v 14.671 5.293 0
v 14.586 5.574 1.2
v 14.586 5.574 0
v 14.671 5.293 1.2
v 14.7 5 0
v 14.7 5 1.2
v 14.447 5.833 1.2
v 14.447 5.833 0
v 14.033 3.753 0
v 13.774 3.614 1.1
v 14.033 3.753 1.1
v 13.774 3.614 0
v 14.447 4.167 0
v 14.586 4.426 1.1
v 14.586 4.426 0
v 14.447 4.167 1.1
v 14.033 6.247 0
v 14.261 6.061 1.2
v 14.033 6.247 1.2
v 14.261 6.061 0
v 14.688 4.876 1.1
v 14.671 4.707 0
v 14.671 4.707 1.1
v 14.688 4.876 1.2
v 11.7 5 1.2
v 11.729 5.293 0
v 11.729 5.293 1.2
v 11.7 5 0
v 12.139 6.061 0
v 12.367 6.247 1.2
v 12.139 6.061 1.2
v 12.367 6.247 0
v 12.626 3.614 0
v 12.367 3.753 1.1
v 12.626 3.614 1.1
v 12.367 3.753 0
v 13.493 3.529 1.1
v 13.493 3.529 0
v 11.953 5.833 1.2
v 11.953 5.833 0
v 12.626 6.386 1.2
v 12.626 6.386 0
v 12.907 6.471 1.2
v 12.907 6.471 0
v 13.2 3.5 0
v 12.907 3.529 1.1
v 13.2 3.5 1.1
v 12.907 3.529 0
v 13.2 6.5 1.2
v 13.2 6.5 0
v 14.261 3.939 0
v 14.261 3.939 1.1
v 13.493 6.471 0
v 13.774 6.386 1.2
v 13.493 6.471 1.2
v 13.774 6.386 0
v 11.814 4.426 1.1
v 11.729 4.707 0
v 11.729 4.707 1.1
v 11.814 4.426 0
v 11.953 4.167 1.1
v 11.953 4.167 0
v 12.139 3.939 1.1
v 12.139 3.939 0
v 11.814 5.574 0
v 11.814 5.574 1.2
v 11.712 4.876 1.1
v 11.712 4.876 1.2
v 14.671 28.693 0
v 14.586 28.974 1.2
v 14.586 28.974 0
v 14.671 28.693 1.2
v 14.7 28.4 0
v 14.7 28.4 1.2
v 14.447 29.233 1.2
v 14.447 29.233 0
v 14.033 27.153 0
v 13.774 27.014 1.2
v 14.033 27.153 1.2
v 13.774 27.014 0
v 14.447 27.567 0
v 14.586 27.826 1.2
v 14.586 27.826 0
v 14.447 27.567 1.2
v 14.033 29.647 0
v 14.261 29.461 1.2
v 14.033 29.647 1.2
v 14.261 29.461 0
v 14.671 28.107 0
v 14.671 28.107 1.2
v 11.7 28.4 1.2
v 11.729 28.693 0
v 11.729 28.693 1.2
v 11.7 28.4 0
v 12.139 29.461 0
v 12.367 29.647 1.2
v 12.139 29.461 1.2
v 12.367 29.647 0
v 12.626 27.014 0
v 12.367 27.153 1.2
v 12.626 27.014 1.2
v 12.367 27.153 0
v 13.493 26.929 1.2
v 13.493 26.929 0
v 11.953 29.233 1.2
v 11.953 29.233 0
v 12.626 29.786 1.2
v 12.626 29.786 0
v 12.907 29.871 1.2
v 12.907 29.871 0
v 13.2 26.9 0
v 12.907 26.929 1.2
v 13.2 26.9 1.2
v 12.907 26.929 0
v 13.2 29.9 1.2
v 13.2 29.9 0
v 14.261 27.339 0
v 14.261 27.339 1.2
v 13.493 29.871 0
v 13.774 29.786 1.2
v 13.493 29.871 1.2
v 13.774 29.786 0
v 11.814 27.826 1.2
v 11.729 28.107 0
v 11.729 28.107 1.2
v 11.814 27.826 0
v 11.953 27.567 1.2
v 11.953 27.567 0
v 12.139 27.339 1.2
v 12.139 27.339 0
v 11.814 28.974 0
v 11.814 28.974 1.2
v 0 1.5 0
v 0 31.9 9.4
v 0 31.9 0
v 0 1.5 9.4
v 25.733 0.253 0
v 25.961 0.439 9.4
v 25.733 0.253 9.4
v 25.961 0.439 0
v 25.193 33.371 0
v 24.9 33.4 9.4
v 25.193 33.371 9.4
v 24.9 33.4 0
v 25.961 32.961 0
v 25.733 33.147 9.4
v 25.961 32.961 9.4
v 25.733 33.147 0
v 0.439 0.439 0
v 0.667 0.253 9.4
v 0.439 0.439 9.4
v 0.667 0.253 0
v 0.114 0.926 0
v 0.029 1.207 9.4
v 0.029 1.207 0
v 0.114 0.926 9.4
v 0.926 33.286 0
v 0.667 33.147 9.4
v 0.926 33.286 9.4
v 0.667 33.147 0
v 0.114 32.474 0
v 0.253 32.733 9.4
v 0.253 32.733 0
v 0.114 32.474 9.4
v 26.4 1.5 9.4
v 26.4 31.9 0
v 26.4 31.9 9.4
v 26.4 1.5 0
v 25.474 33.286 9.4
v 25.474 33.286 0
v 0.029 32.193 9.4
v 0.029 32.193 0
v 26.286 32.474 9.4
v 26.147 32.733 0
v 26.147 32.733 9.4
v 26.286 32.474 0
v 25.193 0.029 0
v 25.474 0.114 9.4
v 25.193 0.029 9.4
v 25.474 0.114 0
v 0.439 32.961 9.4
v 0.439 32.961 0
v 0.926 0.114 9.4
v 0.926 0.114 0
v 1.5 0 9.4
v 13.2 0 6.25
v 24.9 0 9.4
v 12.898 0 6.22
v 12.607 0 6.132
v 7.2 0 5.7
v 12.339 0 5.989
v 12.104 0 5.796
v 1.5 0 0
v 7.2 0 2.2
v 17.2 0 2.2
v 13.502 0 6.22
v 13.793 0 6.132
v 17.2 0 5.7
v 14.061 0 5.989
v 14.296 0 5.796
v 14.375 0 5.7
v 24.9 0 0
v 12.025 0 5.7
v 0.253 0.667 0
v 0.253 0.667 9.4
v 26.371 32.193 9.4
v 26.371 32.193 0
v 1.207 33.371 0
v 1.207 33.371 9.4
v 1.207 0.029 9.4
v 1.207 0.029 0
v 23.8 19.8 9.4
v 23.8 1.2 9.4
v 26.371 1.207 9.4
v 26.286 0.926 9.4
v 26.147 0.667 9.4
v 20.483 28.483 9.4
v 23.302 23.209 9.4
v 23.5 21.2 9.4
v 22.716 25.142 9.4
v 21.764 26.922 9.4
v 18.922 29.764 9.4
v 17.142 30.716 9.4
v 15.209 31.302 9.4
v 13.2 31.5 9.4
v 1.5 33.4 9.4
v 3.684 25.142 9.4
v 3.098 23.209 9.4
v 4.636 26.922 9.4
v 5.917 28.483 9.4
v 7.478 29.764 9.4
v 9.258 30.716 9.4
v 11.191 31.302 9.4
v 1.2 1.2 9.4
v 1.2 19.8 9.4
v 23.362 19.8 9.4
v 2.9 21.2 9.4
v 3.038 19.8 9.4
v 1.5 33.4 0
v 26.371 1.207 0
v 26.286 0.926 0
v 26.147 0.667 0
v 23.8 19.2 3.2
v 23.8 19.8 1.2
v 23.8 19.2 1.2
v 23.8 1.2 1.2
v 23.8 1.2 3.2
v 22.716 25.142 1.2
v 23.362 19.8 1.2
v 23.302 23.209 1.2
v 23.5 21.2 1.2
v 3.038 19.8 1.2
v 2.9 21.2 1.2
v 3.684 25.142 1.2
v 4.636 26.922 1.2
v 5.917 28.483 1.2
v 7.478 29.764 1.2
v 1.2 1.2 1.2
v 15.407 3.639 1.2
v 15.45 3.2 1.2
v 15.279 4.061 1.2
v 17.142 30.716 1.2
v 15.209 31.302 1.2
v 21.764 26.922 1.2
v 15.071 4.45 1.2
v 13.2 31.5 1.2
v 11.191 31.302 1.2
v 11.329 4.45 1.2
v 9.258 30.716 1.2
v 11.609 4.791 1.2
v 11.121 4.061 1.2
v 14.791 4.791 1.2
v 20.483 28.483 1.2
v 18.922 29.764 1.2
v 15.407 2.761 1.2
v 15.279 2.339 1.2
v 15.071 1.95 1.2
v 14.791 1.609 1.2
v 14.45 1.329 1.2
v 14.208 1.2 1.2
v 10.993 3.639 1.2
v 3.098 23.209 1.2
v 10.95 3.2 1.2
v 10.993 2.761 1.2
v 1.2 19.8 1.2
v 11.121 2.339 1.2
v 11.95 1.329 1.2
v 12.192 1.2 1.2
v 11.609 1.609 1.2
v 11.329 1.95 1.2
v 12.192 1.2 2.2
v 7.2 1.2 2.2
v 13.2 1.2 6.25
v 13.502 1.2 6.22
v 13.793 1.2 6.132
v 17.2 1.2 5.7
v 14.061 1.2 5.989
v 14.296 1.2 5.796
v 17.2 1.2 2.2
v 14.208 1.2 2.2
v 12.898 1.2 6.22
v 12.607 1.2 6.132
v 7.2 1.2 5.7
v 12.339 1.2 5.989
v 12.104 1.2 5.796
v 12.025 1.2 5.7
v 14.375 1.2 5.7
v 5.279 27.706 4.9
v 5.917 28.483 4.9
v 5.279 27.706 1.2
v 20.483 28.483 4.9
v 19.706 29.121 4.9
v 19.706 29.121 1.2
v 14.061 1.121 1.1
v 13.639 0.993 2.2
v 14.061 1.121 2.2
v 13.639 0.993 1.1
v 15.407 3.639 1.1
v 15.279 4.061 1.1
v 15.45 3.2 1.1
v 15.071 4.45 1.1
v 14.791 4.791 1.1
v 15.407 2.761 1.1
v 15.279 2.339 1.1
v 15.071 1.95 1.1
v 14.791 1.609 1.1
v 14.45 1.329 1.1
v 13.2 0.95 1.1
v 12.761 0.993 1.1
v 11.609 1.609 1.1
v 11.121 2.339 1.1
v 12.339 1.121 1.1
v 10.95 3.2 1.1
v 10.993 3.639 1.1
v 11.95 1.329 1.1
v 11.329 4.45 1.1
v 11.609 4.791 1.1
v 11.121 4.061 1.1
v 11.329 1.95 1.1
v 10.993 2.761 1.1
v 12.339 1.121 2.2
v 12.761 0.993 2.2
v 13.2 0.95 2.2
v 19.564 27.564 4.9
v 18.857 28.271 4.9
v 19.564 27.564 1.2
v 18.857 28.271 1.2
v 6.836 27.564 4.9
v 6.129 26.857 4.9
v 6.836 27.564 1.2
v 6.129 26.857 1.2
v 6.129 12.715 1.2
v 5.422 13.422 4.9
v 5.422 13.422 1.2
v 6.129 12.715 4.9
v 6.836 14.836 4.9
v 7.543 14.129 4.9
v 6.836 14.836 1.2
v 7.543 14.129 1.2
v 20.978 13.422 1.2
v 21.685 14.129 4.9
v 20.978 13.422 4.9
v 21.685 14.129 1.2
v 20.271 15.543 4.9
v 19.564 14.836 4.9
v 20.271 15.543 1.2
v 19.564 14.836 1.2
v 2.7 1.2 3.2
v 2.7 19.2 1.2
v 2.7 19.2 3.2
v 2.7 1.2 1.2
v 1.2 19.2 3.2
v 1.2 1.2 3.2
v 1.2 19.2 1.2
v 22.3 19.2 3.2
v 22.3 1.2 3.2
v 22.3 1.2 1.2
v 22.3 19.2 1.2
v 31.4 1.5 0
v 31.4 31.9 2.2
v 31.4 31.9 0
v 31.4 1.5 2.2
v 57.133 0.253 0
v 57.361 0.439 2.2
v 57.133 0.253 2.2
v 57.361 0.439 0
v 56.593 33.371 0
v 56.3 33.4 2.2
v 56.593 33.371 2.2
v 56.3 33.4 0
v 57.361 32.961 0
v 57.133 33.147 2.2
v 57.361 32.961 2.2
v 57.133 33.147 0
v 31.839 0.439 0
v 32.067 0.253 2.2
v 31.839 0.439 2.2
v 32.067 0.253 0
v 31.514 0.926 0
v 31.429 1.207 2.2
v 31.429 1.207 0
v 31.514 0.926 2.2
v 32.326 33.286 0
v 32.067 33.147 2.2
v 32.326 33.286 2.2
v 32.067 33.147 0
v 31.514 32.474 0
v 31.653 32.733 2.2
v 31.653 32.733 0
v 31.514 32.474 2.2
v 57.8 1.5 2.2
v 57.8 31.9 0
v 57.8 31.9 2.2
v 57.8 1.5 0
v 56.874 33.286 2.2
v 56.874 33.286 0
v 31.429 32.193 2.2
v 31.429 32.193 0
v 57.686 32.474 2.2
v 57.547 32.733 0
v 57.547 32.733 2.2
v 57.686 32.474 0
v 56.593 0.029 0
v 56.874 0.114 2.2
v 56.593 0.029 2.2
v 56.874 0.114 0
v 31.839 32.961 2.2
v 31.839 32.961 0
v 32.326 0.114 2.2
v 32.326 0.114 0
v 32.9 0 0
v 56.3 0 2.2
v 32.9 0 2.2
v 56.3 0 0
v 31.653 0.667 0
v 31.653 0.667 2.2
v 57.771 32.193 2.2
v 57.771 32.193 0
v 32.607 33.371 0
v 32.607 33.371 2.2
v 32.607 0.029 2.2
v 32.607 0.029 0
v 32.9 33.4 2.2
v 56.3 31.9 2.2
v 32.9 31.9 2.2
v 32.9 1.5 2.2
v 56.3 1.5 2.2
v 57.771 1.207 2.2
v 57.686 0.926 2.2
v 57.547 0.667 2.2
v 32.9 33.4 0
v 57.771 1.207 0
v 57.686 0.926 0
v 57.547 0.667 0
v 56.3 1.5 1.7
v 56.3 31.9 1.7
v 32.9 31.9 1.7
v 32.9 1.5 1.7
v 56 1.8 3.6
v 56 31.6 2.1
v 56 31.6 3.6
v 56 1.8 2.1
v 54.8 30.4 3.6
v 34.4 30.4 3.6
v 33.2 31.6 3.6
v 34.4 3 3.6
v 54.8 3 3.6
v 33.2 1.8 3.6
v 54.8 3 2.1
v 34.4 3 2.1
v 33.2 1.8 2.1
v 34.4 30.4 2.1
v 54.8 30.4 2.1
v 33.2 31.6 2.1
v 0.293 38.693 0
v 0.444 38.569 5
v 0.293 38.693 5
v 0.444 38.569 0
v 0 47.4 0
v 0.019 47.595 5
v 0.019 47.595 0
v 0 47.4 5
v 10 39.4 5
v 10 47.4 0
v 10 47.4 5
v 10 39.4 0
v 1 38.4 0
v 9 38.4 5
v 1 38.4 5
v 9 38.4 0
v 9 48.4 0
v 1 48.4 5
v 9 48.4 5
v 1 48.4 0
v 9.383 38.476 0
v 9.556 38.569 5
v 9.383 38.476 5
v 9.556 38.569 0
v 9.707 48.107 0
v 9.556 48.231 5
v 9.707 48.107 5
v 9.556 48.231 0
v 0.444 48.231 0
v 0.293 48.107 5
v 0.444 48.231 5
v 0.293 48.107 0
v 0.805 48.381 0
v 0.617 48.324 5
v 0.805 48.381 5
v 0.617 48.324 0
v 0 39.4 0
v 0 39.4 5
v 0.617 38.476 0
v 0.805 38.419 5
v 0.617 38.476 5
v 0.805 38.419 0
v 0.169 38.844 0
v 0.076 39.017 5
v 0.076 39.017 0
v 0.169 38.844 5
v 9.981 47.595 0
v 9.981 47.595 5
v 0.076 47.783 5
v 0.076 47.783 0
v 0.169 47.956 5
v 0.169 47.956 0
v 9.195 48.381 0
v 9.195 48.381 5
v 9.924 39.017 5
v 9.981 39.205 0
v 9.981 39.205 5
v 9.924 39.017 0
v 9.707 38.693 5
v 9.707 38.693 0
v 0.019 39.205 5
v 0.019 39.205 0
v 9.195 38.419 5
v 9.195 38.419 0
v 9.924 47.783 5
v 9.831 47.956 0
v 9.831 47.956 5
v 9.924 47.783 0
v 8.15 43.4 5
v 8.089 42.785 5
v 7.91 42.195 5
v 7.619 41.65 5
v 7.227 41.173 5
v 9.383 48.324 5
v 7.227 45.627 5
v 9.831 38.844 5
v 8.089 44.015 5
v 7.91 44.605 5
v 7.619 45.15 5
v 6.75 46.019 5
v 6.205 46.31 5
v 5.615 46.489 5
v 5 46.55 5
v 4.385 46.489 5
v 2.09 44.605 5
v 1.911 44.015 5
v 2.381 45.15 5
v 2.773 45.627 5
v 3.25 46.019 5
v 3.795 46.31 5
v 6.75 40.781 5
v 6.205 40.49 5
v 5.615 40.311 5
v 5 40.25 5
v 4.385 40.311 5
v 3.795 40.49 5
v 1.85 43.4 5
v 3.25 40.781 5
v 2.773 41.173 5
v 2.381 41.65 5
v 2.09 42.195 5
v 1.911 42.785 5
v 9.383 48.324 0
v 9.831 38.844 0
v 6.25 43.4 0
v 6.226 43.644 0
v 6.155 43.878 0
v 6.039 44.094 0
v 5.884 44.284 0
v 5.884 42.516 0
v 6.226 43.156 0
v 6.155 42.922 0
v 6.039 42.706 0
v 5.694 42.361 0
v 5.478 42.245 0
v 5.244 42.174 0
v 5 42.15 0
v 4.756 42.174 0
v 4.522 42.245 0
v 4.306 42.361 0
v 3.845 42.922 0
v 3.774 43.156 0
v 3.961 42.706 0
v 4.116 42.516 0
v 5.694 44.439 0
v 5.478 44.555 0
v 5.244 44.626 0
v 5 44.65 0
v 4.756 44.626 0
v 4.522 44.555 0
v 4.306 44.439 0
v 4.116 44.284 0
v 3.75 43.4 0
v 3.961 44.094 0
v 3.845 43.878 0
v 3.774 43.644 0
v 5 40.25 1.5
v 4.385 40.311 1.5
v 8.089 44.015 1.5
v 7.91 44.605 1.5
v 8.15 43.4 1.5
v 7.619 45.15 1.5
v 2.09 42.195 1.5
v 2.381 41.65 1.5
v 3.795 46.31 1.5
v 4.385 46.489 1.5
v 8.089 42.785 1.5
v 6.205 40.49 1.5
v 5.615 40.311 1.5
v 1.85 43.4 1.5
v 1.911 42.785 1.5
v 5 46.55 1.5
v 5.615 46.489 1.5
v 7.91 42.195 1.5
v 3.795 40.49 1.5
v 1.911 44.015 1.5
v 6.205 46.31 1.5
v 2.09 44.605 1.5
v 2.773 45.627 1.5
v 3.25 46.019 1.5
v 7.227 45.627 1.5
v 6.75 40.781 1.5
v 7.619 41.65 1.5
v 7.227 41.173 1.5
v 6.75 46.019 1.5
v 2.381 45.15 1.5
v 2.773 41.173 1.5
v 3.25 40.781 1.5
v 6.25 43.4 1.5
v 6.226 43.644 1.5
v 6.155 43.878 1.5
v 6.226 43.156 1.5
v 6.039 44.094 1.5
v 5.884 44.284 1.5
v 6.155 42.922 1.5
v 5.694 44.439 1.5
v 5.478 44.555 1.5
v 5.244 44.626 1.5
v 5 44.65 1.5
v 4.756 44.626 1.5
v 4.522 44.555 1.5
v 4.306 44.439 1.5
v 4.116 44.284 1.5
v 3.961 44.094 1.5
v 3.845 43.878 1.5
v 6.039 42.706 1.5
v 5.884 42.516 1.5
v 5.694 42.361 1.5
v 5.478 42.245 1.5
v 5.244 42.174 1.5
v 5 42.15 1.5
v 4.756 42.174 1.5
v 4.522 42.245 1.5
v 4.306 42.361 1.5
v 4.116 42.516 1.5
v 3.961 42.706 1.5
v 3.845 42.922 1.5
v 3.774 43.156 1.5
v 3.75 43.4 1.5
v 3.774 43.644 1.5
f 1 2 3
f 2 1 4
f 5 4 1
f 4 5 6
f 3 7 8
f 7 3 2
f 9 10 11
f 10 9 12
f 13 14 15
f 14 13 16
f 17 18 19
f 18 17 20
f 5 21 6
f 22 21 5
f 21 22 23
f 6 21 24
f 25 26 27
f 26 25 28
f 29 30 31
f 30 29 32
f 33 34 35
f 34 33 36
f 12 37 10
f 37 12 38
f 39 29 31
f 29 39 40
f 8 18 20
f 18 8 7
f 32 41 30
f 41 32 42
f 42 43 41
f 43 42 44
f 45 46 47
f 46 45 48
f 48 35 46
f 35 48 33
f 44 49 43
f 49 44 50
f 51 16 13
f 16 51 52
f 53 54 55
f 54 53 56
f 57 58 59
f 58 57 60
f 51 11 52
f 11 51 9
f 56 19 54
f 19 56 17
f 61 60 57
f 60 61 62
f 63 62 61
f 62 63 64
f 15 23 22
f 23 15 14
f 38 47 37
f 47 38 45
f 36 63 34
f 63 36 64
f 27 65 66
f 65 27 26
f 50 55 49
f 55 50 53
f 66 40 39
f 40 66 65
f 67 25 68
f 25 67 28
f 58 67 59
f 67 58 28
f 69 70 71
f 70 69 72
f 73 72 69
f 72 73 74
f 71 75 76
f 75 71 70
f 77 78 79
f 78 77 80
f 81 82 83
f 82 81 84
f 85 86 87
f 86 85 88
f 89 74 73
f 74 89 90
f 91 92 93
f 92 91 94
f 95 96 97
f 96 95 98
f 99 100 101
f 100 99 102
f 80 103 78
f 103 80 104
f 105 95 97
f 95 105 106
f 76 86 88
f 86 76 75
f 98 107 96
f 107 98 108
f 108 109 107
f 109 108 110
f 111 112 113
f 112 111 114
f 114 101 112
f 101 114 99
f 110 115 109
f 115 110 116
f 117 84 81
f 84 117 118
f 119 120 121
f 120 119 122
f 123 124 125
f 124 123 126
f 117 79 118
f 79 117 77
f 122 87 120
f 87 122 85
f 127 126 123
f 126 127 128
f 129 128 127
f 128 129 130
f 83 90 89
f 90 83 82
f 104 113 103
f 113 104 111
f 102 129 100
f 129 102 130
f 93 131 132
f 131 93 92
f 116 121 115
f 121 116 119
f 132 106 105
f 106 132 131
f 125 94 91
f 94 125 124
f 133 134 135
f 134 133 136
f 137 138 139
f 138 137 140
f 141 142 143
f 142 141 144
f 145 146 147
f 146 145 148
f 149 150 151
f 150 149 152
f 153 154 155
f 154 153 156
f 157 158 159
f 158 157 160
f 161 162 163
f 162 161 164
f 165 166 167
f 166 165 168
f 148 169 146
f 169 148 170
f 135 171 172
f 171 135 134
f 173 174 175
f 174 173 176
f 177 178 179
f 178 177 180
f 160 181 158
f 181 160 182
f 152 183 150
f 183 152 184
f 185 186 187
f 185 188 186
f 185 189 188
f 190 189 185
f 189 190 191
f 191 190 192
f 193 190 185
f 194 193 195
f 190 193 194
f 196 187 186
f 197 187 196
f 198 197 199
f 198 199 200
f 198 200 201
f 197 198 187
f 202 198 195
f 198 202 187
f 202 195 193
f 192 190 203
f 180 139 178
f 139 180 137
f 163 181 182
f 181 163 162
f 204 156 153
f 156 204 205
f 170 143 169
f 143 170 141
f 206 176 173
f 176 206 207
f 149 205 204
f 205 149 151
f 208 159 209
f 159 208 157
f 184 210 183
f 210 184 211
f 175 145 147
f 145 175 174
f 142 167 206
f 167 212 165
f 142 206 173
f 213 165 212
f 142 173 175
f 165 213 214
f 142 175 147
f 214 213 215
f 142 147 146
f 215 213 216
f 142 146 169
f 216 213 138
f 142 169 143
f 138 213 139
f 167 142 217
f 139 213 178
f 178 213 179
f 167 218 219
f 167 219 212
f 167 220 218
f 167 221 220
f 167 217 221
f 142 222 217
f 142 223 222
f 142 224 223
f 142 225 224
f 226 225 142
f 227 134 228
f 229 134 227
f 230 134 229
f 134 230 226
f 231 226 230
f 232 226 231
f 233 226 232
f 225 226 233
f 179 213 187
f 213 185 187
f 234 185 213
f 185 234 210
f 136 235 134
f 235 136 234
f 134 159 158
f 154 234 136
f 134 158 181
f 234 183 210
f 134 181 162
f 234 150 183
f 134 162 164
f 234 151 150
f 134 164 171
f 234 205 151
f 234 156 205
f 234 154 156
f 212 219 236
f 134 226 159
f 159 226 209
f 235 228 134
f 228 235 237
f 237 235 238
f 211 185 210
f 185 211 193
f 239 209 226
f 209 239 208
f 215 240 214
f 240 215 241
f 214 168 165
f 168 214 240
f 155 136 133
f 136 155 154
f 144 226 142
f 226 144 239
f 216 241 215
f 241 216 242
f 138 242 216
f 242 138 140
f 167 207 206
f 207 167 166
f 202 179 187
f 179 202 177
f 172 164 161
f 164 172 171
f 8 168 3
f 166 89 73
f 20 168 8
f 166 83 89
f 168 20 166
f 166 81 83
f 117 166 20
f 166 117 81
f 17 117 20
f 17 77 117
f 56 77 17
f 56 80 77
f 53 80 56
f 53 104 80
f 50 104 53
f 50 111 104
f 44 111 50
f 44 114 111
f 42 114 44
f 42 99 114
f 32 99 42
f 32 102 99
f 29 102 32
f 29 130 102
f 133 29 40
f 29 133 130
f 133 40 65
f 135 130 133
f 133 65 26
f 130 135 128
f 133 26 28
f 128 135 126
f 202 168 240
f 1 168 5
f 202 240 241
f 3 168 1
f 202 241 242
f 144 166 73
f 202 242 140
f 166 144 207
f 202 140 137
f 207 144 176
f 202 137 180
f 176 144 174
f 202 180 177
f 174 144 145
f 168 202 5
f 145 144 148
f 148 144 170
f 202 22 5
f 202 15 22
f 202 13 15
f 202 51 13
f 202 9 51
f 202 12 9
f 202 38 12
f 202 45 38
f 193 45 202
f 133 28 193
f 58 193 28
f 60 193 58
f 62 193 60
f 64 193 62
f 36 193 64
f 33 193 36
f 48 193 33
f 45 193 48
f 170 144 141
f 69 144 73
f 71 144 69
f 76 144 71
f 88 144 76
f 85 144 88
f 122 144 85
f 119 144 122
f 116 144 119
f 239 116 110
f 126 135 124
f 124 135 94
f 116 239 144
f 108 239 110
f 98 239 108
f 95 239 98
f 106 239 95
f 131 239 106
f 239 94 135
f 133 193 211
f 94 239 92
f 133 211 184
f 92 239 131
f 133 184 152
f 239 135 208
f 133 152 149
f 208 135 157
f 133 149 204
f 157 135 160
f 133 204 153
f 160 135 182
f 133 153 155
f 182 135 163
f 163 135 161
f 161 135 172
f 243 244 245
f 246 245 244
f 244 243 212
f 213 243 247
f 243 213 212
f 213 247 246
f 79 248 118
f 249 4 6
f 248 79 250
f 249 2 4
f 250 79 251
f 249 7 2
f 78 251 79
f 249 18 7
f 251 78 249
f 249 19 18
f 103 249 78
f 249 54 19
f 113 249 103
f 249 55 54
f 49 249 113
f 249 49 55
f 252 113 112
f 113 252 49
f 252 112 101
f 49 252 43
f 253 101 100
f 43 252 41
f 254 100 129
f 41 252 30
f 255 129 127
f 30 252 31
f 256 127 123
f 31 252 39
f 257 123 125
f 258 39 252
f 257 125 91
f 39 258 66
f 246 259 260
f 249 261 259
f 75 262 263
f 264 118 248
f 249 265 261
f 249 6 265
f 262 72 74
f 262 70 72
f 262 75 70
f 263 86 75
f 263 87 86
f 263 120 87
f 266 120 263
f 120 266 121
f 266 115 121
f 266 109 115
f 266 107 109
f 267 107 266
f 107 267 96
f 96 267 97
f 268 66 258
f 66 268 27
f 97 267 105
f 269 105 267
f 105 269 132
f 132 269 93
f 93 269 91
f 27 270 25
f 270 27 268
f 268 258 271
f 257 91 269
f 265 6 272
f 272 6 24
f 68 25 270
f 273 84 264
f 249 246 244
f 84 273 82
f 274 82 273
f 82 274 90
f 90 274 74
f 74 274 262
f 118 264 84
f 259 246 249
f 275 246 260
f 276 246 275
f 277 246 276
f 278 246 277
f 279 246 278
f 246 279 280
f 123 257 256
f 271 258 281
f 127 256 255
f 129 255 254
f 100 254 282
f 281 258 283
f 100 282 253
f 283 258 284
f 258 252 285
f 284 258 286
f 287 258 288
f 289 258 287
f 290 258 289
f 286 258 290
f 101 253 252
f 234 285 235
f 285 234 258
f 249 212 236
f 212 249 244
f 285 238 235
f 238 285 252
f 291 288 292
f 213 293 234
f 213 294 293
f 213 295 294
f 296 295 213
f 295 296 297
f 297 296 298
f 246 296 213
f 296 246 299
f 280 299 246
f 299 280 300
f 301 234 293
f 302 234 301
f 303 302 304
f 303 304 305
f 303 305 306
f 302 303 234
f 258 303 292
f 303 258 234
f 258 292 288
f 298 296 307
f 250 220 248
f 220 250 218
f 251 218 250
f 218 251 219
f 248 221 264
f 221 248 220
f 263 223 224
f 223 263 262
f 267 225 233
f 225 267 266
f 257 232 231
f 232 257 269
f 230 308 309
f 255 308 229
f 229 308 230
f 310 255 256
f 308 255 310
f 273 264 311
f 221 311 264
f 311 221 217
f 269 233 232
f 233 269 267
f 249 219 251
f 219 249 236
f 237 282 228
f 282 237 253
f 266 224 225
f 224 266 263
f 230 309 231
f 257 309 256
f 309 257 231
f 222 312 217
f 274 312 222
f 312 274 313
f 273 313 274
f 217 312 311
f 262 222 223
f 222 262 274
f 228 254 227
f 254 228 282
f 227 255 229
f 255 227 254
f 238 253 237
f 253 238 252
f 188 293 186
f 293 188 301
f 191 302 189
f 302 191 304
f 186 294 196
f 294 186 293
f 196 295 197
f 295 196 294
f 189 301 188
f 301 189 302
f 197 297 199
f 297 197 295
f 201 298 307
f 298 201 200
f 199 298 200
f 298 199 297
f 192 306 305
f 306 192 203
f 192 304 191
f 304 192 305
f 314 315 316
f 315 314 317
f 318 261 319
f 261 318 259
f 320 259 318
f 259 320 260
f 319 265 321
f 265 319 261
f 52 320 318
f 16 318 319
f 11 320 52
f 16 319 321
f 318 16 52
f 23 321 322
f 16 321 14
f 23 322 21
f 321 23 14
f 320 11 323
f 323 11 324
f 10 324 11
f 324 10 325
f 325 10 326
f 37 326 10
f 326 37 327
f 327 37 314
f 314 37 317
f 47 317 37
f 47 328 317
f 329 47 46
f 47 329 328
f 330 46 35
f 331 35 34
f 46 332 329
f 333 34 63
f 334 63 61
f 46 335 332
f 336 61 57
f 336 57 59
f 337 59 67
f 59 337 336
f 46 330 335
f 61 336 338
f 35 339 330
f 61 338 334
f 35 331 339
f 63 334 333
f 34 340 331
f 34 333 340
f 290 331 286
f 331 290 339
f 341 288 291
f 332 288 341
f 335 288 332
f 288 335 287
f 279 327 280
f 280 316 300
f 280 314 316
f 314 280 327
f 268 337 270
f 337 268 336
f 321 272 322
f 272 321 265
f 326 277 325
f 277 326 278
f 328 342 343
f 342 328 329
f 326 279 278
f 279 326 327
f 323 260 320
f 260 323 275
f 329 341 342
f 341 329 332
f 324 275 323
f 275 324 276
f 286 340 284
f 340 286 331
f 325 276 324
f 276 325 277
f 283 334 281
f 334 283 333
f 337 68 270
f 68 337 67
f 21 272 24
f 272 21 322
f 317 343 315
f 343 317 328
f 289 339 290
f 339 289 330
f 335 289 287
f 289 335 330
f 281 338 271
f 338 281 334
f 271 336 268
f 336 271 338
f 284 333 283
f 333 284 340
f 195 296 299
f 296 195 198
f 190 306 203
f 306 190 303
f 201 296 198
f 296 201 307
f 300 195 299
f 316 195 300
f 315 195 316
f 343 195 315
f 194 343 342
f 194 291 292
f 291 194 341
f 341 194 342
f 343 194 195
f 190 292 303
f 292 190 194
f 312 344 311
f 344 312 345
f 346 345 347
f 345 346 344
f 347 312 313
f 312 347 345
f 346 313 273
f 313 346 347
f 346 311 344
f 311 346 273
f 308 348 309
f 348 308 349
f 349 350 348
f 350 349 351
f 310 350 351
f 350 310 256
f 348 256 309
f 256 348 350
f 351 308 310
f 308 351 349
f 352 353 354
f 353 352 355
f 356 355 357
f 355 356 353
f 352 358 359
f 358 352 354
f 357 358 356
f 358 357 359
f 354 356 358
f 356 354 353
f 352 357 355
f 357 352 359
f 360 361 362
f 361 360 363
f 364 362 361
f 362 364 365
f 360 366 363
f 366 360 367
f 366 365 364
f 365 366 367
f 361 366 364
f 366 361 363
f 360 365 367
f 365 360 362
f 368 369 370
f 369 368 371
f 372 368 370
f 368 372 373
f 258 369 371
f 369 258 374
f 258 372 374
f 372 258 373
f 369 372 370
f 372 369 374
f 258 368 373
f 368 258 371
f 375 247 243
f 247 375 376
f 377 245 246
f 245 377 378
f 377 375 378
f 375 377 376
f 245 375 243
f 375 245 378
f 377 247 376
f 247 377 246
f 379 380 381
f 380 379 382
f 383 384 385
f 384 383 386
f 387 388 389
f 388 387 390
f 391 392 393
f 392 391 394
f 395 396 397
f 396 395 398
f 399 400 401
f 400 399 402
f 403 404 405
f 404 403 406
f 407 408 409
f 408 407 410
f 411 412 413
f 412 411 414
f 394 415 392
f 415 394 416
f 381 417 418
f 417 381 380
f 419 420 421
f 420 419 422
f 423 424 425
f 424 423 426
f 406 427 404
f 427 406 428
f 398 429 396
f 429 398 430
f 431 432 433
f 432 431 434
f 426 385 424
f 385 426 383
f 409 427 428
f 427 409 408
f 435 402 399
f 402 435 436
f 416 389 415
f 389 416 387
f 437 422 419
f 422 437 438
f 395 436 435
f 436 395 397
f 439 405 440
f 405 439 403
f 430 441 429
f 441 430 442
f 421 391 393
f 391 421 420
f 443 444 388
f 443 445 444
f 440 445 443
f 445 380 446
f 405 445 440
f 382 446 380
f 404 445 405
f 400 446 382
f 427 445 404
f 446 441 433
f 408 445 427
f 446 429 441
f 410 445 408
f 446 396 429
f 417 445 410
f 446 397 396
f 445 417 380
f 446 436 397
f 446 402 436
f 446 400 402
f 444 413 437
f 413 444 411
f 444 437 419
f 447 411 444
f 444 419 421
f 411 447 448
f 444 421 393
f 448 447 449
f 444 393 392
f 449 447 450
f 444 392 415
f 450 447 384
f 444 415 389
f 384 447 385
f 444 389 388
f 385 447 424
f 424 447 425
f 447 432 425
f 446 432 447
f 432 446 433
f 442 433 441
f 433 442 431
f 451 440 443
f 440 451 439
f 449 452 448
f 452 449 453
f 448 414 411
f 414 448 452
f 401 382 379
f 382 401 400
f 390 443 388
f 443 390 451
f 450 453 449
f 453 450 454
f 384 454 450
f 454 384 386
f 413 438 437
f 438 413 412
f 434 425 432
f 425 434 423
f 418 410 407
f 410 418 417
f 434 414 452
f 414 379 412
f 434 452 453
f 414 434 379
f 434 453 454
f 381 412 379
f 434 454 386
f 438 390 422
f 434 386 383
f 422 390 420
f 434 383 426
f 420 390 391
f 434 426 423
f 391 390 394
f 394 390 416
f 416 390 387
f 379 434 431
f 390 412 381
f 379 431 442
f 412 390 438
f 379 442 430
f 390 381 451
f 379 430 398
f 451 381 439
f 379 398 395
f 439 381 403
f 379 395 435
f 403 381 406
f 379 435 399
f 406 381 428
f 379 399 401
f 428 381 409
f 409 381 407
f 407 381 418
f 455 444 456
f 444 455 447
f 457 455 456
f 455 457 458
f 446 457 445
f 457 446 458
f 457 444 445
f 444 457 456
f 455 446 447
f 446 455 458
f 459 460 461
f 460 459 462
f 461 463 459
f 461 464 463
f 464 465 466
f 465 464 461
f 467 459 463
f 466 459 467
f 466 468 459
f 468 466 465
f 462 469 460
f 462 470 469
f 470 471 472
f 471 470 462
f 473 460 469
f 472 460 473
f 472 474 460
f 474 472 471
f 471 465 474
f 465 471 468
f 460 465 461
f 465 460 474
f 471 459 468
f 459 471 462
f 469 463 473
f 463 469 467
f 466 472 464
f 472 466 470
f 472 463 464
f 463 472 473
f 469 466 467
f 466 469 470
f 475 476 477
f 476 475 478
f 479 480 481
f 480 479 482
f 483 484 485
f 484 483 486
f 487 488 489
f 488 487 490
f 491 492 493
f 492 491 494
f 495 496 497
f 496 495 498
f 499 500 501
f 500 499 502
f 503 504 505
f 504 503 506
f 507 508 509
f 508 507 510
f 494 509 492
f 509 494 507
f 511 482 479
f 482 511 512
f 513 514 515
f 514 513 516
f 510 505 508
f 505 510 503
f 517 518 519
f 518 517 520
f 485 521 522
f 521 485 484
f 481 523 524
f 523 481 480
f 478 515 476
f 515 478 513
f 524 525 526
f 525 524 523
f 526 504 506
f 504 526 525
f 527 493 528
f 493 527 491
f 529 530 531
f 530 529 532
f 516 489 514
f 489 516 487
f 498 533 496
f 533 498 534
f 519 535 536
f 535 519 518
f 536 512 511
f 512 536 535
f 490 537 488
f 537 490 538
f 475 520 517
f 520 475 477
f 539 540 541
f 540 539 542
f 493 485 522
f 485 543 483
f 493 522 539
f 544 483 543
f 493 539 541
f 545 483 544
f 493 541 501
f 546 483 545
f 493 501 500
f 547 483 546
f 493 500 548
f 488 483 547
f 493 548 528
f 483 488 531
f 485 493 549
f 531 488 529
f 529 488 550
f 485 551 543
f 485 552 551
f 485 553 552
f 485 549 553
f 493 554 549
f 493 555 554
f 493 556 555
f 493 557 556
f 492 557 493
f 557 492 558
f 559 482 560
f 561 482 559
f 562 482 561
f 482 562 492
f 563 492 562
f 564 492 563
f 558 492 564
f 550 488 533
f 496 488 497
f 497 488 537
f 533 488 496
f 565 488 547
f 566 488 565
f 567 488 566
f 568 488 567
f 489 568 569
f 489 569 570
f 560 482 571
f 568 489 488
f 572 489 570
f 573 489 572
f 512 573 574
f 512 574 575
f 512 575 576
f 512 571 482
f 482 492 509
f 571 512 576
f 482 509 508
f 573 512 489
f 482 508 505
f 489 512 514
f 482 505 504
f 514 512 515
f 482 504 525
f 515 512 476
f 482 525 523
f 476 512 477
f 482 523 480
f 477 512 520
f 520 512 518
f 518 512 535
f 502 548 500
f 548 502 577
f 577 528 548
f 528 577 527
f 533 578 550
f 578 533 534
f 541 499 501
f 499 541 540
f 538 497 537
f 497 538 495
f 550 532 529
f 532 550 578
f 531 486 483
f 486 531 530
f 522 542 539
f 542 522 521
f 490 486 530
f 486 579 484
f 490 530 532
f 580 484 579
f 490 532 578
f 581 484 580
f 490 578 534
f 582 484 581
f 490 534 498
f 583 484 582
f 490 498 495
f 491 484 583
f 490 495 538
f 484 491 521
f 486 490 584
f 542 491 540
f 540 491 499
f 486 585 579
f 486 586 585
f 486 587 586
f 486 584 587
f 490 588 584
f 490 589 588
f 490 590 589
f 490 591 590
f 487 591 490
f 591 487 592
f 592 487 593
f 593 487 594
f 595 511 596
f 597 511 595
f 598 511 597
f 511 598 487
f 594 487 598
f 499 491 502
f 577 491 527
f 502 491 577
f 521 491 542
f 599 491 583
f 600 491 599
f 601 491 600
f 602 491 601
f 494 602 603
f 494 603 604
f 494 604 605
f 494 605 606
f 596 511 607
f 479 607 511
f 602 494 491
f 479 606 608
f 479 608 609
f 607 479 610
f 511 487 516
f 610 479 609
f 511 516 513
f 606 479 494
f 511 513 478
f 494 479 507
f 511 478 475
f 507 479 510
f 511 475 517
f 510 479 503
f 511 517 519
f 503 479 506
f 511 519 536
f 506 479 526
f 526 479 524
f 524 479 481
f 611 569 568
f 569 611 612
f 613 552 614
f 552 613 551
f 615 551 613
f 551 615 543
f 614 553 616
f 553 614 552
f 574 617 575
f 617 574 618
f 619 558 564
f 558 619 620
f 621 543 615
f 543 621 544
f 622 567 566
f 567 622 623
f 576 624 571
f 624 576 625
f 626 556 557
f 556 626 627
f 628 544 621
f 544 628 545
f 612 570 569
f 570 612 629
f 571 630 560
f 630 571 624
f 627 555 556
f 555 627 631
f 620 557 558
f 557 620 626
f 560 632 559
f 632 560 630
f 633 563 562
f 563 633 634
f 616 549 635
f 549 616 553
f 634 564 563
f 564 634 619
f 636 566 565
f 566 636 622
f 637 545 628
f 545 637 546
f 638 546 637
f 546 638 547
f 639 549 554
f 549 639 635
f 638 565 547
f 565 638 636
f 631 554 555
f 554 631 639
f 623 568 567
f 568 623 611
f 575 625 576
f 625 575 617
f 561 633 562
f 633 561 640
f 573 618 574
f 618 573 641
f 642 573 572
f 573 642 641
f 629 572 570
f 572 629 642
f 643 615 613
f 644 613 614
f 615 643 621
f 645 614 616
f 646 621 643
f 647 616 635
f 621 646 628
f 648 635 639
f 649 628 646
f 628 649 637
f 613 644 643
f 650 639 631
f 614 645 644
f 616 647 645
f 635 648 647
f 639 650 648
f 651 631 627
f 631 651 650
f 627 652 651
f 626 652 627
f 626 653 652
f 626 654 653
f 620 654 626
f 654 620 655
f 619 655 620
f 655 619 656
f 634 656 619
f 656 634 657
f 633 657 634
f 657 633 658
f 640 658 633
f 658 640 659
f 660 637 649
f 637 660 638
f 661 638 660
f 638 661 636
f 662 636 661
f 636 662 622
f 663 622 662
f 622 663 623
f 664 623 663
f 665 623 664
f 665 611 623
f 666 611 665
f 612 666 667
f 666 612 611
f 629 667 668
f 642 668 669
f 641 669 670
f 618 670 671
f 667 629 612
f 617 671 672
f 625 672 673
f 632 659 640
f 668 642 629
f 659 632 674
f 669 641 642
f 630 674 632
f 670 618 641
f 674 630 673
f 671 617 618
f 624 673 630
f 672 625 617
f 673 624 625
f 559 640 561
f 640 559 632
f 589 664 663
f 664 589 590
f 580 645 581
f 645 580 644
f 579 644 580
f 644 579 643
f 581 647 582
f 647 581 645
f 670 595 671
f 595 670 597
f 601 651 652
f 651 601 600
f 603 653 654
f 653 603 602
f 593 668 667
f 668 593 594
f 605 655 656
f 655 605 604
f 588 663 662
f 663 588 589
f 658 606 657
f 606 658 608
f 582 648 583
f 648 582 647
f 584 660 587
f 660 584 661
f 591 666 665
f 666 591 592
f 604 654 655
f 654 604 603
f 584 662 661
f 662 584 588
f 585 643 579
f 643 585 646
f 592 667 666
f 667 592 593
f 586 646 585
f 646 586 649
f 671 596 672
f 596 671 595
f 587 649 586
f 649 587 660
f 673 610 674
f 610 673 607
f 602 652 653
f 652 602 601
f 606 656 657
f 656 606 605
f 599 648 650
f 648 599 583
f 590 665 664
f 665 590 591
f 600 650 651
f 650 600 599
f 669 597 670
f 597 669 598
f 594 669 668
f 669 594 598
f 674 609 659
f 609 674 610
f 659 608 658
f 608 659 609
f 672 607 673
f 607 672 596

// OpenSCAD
// LifeOps Door Sensor Case
// For ESP32-C3 Super Mini + Reed Switch + CR2032 battery
// Ultra-compact for door mounting

// Dimensions (mm)
esp32_width = 22;
esp32_length = 18;
esp32_height = 5;

cr2032_diameter = 20;
cr2032_height = 3.2;

reed_length = 14;
reed_diameter = 2.5;

magnet_diameter = 6;
magnet_height = 3;

// Case parameters
wall_thickness = 1.2;
corner_radius = 1.5;
tolerance = 0.3;

// Calculated dimensions - vertical orientation
case_width = esp32_width + wall_thickness * 2 + 2;
case_length = esp32_length + cr2032_diameter/2 + wall_thickness * 2 + 3;
case_height = max(esp32_height, cr2032_height) + wall_thickness * 2 + 2;

// Quality
$fn = 32;

echo("Door sensor case:", case_width, "x", case_length, "x", case_height, "mm");

module rounded_box(w, l, h, r) {
    hull() {
        for (x = [r, w - r]) {
            for (y = [r, l - r]) {
                translate([x, y, 0])
                    cylinder(h = h, r = r);
            }
        }
    }
}

module door_sensor_case() {
    difference() {
        // Outer shell
        rounded_box(case_width, case_length, case_height, corner_radius);

        // Main cavity for ESP32
        translate([wall_thickness, wall_thickness, wall_thickness])
            cube([
                esp32_width + tolerance * 2,
                esp32_length + tolerance * 2,
                case_height
            ]);

        // CR2032 holder cavity
        translate([case_width/2, case_length - wall_thickness - cr2032_diameter/2 - 1, wall_thickness])
            cylinder(d = cr2032_diameter + tolerance * 2, h = case_height);

        // Reed switch channel
        translate([case_width/2, -0.1, case_height/2])
            rotate([-90, 0, 0])
                cylinder(d = reed_diameter + tolerance * 2, h = case_length/2);

        // Reed switch exit hole
        translate([case_width/2, wall_thickness + 2, wall_thickness - 0.1])
            cylinder(d = reed_diameter + 2, h = wall_thickness + 0.2);

        // USB port cutout (for initial programming)
        translate([wall_thickness + esp32_width/2 - 5, -0.1, wall_thickness + 1])
            cube([10, wall_thickness + 0.2, 3.5]);

        // Mounting holes
        for (y = [5, case_length - 5]) {
            translate([case_width/2, y, -0.1])
                cylinder(d = 3, h = wall_thickness + 0.2);
        }
    }

    // CR2032 retaining clips
    translate([case_width/2, case_length - wall_thickness - cr2032_diameter/2 - 1, wall_thickness]) {
        for (a = [45, 135, 225, 315]) {
            rotate([0, 0, a])
                translate([cr2032_diameter/2 - 1, 0, 0])
                    cube([2, 1, cr2032_height + 0.5]);
        }
    }

    // ESP32 support rails
    translate([wall_thickness, wall_thickness, wall_thickness]) {
        cube([1.5, esp32_length, 2]);
        translate([esp32_width + tolerance * 2 - 1.5, 0, 0])
            cube([1.5, esp32_length, 2]);
    }
}

module door_sensor_lid() {
    lid_height = wall_thickness + 1;

    difference() {
        // Main lid
        rounded_box(case_width, case_length, lid_height, corner_radius);

        // Inner lip recess
        translate([wall_thickness + tolerance, wall_thickness + tolerance, lid_height - 0.5])
            cube([
                case_width - wall_thickness * 2 - tolerance * 2,
                case_length - wall_thickness * 2 - tolerance * 2,
                0.6
            ]);
    }

    // Inner lip
    translate([wall_thickness + tolerance * 2, wall_thickness + tolerance * 2, lid_height - 0.1])
        difference() {
            cube([
                case_width - wall_thickness * 2 - tolerance * 4,
                case_length - wall_thickness * 2 - tolerance * 4,
                1.5
            ]);
            translate([wall_thickness, wall_thickness, -0.1])
                cube([
                    case_width - wall_thickness * 4 - tolerance * 4,
                    case_length - wall_thickness * 4 - tolerance * 4,
                    1.7
                ]);
        }
}

module magnet_holder() {
    // Separate piece for door frame
    difference() {
        rounded_box(magnet_diameter + 4, magnet_diameter + 4, magnet_height + 2, 1);

        // Magnet cavity
        translate([(magnet_diameter + 4)/2, (magnet_diameter + 4)/2, 1.5])
            cylinder(d = magnet_diameter + tolerance, h = magnet_height + 1);

        // Mounting hole
        translate([(magnet_diameter + 4)/2, (magnet_diameter + 4)/2, -0.1])
            cylinder(d = 2.5, h = 2);
    }
}

// Render parts
door_sensor_case();

// Lid
translate([case_width + 5, 0, 0])
    door_sensor_lid();

// Magnet holder
translate([0, case_length + 5, 0])
    magnet_holder();
